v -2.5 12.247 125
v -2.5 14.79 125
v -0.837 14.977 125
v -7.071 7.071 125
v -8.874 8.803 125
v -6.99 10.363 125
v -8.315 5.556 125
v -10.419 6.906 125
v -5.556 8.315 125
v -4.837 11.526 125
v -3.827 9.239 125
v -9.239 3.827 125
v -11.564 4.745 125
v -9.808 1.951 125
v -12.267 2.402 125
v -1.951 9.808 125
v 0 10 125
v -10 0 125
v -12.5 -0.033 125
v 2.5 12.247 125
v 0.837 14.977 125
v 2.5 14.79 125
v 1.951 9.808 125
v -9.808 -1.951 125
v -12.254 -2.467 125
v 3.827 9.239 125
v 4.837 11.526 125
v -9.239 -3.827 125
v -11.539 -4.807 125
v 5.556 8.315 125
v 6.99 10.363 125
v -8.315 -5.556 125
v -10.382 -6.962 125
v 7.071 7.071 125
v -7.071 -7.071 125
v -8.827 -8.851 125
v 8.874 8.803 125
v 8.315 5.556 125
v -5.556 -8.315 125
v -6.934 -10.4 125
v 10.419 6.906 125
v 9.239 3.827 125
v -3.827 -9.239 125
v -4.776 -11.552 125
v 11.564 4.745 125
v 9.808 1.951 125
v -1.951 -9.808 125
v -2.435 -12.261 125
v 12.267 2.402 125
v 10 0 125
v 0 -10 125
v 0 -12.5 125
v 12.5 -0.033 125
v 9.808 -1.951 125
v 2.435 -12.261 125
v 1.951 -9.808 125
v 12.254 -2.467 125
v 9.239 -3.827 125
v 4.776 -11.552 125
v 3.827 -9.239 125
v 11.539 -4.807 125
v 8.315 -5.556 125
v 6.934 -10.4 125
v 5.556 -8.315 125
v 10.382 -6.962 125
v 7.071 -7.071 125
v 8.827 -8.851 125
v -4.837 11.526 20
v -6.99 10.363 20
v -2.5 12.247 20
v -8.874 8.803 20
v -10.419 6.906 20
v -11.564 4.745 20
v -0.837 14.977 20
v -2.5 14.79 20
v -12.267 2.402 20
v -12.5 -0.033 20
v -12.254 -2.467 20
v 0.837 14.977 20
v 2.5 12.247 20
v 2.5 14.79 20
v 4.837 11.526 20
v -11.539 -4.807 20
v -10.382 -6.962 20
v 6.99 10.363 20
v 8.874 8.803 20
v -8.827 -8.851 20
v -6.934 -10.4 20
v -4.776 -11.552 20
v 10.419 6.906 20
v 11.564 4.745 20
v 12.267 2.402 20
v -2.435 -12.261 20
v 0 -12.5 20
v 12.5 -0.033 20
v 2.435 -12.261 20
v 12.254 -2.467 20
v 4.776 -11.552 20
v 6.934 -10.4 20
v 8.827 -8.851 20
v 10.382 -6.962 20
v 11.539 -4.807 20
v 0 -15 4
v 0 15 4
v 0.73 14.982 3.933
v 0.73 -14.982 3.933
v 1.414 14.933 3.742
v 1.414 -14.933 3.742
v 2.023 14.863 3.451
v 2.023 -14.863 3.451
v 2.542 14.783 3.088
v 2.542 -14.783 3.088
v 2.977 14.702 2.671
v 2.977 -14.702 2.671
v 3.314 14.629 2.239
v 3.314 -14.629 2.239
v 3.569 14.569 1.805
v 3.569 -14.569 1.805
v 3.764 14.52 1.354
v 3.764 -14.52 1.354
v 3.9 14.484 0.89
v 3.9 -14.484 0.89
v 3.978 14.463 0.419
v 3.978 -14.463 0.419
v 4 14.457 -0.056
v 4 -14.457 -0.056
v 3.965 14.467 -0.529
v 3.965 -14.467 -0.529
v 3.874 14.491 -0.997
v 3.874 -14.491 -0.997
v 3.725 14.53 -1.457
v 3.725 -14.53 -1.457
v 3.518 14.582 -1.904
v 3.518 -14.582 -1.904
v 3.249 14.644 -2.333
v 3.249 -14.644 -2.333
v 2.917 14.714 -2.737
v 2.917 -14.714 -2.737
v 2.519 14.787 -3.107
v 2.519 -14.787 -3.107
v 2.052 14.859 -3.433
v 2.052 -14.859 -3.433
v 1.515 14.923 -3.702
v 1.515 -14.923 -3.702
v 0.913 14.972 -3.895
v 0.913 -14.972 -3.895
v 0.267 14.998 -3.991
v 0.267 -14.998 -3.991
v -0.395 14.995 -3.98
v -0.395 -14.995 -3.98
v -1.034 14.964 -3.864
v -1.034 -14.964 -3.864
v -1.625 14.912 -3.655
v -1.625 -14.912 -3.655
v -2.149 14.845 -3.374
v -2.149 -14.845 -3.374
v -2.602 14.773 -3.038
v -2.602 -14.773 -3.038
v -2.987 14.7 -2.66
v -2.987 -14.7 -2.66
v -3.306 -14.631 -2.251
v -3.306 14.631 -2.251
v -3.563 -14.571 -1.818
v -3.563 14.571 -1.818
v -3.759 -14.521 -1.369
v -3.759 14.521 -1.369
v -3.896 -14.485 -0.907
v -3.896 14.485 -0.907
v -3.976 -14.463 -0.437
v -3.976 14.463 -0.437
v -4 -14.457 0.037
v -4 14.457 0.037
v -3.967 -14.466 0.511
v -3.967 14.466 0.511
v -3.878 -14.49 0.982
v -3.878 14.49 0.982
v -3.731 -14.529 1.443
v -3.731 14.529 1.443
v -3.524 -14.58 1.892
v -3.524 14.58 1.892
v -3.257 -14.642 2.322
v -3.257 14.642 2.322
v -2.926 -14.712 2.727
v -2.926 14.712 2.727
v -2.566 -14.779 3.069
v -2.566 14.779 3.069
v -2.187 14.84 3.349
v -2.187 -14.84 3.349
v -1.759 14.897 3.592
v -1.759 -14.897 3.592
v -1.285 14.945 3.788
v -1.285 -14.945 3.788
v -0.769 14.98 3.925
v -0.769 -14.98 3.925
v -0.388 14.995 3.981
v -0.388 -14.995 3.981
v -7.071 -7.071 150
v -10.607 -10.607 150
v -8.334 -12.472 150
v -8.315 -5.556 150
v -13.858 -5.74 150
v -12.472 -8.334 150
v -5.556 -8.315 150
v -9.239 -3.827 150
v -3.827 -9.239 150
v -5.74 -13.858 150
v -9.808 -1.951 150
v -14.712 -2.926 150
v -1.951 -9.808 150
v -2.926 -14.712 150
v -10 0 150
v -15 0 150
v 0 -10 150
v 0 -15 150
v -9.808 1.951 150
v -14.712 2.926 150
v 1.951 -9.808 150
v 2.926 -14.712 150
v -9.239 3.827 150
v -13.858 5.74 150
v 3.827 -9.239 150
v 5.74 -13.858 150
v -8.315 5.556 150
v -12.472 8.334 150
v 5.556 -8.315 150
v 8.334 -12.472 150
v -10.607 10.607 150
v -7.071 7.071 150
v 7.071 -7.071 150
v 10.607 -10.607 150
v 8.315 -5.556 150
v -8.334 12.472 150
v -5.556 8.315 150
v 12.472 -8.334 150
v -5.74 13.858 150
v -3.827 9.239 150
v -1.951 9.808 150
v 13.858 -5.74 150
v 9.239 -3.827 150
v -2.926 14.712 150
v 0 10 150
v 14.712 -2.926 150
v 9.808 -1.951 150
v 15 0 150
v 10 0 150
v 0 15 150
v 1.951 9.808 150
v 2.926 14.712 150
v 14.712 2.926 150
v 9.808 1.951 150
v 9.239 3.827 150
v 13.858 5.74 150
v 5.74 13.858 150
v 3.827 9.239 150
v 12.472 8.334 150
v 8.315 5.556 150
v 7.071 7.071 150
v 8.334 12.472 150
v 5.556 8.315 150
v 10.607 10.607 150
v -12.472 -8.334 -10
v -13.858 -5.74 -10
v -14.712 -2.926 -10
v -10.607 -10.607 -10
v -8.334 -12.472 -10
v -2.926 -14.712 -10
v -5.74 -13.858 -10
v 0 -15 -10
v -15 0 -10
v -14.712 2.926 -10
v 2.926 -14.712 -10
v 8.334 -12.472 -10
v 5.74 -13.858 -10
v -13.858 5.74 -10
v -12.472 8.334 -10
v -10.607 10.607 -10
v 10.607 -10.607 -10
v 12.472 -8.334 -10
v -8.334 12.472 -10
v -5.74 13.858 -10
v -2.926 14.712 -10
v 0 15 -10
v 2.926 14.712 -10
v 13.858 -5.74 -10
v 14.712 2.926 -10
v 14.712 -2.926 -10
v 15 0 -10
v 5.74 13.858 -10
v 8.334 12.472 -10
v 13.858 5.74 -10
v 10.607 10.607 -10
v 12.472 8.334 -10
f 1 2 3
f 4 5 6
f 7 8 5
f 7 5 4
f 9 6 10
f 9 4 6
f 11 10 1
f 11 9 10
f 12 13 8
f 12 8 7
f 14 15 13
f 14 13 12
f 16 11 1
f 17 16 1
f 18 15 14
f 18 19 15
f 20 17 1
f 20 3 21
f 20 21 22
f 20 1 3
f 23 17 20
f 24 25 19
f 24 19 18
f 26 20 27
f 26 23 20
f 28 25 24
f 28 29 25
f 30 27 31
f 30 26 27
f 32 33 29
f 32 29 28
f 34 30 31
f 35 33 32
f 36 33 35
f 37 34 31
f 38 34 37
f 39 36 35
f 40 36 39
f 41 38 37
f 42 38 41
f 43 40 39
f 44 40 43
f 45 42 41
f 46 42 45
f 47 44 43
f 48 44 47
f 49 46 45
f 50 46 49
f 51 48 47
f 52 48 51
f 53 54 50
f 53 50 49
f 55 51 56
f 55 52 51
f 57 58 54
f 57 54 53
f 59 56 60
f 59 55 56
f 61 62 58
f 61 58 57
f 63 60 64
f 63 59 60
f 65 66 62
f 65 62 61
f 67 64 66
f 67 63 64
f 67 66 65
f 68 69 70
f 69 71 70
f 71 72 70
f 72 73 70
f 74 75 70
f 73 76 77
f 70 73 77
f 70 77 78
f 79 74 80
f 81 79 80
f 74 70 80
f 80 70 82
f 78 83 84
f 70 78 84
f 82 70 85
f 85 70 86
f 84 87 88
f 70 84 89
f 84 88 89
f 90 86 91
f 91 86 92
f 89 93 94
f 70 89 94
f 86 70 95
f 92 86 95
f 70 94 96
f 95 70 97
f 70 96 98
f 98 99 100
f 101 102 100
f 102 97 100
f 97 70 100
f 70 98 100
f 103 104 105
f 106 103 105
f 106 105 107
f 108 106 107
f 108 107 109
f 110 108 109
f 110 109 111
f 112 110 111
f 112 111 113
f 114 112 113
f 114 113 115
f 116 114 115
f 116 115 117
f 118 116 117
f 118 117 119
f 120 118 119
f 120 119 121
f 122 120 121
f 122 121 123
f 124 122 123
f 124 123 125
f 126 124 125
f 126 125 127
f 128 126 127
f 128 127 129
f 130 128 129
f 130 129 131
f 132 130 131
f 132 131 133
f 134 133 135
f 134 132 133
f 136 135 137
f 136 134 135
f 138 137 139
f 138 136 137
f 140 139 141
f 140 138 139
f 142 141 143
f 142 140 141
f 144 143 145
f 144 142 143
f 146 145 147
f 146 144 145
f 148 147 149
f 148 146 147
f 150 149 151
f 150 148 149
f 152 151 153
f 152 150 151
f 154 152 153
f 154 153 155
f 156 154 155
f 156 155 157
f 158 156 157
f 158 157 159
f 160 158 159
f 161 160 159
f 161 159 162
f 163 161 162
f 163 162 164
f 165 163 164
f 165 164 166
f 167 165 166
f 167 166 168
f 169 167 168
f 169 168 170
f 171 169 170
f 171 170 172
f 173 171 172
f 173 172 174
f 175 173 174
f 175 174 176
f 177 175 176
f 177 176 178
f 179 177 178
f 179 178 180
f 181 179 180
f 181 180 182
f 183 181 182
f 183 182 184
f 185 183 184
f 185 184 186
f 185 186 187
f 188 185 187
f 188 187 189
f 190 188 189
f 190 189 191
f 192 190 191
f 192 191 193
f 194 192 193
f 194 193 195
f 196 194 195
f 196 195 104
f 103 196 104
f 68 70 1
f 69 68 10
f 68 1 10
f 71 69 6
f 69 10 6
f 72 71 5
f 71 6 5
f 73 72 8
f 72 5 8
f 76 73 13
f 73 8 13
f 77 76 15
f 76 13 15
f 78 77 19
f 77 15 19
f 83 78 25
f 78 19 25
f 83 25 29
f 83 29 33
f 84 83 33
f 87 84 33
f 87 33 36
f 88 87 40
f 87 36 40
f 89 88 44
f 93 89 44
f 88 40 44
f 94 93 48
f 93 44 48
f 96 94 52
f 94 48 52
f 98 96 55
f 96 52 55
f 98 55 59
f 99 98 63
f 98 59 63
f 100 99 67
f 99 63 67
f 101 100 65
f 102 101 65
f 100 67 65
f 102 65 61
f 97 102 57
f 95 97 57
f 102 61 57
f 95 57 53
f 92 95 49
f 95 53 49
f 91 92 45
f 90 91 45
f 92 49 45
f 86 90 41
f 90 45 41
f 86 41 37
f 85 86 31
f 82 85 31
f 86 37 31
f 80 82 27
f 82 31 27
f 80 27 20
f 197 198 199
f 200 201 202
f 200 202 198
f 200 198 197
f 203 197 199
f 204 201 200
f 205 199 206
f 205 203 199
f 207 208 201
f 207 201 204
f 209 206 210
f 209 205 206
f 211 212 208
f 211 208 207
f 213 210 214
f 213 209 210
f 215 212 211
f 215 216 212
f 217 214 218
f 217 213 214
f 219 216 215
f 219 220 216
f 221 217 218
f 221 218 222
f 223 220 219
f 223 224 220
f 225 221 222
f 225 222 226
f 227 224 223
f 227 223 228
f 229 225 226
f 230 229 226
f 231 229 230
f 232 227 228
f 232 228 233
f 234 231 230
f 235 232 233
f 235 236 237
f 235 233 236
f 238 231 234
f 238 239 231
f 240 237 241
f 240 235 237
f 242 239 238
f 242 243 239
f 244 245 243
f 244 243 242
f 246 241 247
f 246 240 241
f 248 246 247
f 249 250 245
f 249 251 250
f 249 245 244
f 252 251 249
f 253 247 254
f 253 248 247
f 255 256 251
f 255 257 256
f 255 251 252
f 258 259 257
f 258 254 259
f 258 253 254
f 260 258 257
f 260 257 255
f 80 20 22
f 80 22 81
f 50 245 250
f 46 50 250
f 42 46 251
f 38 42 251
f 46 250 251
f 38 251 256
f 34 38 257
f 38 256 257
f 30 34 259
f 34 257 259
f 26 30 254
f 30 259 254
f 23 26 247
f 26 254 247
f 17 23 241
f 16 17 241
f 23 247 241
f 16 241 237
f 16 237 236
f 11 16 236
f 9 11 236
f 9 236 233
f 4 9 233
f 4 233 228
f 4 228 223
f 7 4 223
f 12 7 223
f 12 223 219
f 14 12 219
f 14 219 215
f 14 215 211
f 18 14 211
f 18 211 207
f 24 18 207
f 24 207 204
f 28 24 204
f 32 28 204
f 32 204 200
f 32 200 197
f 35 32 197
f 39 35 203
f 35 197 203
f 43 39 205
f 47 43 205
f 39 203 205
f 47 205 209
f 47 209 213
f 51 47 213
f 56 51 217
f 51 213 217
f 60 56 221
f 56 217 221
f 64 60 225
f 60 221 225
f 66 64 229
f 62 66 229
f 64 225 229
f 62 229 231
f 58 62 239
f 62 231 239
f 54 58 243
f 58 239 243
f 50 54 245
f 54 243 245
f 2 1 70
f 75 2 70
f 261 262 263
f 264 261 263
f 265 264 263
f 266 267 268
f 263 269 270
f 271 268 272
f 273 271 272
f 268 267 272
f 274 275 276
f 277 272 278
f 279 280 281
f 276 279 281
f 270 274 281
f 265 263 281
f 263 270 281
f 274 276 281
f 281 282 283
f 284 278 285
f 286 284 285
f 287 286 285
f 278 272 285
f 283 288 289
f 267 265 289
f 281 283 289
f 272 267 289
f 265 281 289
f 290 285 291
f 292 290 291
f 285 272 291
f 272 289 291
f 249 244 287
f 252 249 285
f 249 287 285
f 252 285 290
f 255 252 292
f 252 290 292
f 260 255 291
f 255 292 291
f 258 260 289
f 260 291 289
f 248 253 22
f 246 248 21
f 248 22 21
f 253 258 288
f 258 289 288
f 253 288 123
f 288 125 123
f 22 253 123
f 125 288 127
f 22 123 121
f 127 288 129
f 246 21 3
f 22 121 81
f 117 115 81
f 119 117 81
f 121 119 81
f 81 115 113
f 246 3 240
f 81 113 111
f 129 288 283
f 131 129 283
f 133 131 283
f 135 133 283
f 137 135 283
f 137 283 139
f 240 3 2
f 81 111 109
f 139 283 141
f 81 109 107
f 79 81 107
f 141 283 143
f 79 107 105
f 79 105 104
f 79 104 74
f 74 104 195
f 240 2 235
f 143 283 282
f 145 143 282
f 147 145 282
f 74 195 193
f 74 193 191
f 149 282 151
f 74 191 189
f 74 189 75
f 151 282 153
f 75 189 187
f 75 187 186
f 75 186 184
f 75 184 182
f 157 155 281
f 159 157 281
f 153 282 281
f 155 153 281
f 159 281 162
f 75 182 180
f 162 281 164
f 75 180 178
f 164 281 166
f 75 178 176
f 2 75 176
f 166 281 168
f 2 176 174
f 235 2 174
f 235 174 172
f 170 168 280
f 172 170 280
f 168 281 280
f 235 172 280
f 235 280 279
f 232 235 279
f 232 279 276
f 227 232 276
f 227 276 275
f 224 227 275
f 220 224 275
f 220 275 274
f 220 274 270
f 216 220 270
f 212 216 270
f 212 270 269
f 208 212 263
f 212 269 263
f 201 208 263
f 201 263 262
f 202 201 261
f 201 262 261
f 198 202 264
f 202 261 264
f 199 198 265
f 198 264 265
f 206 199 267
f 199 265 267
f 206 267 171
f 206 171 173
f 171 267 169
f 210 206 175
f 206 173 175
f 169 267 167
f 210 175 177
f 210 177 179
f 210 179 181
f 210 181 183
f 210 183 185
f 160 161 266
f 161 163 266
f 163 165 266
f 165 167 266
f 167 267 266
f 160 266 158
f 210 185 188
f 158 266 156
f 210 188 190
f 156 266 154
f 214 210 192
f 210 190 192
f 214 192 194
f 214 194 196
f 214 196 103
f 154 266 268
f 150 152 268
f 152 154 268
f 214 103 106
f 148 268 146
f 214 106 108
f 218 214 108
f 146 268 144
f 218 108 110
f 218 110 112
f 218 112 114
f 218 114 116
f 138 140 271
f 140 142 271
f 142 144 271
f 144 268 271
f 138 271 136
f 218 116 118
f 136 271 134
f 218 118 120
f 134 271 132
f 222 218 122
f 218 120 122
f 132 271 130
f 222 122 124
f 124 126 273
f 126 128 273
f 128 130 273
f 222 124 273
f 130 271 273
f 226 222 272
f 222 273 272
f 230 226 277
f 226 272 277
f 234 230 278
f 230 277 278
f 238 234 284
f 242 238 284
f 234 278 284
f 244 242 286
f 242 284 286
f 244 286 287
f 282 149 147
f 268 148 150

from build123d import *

# Parameters (mm, degrees)
BOSS_EXTRUDE1_DEPTH      = 150
BOSS_EXTRUDE1_DEPTH_BACK = 10
SKETCH1_R                = 15
SKETCH3_R                = 12.5
CUT_EXTRUDE2_DEPTH       = 105
CUT_EXTRUDE3_REACH       = 163.4
SKETCH4_R                = 10
CUT_EXTRUDE4_DEPTH       = 152.492574075
CUT_EXTRUDE4_DEPTH_BACK  = 152.492574075
SKETCH5_R                = 4
SKETCH6_W                = 5
SKETCH6_H                = 105
CUT_EXTRUDE12_DEPTH      = 152.492574194


with BuildPart() as part:
    # Sketch1 → Boss-Extrude1 (new, two sides: drawn at the far end of the back side and taken through both)
    with BuildSketch(Plane.XY.offset(-BOSS_EXTRUDE1_DEPTH_BACK)):
        Circle(SKETCH1_R)
    extrude(amount=BOSS_EXTRUDE1_DEPTH + BOSS_EXTRUDE1_DEPTH_BACK)

    # Sketch3 → Cut-Extrude2 (cut)
    with BuildSketch(Plane.XY.offset(125)):
        Circle(SKETCH3_R)
    extrude(amount=-CUT_EXTRUDE2_DEPTH, mode=Mode.SUBTRACT)

    # Sketch4 → Cut-Extrude3 (cut, up to next)
    with BuildSketch(Plane.XY.offset(150), mode=Mode.PRIVATE) as cut_extrude3_sk1:
        Circle(SKETCH4_R)
    cut_extrude3_tool1 = extrude(cut_extrude3_sk1.sketch, amount=-CUT_EXTRUDE3_REACH, mode=Mode.PRIVATE) & part.part
    add(cut_extrude3_tool1.solids().sort_by_distance((0, 0, 150))[0], mode=Mode.SUBTRACT)

    # Sketch5 → Cut-Extrude4 (cut, two sides: drawn at the far end of the back side and taken through both)
    with BuildSketch(Plane(origin=(0, 0, 0), x_dir=(1, 0, 0), z_dir=(0, 1, 0)).offset(-CUT_EXTRUDE4_DEPTH_BACK)):
        with Locations(Location((0, 0, 0), (0, 0, 270))):
            Circle(SKETCH5_R)
    extrude(amount=CUT_EXTRUDE4_DEPTH + CUT_EXTRUDE4_DEPTH_BACK, mode=Mode.SUBTRACT)

    # Sketch6 → Cut-Extrude12 (cut, through all)
    with BuildSketch(Plane(origin=(0, 0, 0), x_dir=(1, 0, 0), z_dir=(0, 1, 0))):
        with Locations((0, -72.5)):
            Rectangle(SKETCH6_W, SKETCH6_H)
    extrude(amount=CUT_EXTRUDE12_DEPTH, mode=Mode.SUBTRACT)


solid = part.part
